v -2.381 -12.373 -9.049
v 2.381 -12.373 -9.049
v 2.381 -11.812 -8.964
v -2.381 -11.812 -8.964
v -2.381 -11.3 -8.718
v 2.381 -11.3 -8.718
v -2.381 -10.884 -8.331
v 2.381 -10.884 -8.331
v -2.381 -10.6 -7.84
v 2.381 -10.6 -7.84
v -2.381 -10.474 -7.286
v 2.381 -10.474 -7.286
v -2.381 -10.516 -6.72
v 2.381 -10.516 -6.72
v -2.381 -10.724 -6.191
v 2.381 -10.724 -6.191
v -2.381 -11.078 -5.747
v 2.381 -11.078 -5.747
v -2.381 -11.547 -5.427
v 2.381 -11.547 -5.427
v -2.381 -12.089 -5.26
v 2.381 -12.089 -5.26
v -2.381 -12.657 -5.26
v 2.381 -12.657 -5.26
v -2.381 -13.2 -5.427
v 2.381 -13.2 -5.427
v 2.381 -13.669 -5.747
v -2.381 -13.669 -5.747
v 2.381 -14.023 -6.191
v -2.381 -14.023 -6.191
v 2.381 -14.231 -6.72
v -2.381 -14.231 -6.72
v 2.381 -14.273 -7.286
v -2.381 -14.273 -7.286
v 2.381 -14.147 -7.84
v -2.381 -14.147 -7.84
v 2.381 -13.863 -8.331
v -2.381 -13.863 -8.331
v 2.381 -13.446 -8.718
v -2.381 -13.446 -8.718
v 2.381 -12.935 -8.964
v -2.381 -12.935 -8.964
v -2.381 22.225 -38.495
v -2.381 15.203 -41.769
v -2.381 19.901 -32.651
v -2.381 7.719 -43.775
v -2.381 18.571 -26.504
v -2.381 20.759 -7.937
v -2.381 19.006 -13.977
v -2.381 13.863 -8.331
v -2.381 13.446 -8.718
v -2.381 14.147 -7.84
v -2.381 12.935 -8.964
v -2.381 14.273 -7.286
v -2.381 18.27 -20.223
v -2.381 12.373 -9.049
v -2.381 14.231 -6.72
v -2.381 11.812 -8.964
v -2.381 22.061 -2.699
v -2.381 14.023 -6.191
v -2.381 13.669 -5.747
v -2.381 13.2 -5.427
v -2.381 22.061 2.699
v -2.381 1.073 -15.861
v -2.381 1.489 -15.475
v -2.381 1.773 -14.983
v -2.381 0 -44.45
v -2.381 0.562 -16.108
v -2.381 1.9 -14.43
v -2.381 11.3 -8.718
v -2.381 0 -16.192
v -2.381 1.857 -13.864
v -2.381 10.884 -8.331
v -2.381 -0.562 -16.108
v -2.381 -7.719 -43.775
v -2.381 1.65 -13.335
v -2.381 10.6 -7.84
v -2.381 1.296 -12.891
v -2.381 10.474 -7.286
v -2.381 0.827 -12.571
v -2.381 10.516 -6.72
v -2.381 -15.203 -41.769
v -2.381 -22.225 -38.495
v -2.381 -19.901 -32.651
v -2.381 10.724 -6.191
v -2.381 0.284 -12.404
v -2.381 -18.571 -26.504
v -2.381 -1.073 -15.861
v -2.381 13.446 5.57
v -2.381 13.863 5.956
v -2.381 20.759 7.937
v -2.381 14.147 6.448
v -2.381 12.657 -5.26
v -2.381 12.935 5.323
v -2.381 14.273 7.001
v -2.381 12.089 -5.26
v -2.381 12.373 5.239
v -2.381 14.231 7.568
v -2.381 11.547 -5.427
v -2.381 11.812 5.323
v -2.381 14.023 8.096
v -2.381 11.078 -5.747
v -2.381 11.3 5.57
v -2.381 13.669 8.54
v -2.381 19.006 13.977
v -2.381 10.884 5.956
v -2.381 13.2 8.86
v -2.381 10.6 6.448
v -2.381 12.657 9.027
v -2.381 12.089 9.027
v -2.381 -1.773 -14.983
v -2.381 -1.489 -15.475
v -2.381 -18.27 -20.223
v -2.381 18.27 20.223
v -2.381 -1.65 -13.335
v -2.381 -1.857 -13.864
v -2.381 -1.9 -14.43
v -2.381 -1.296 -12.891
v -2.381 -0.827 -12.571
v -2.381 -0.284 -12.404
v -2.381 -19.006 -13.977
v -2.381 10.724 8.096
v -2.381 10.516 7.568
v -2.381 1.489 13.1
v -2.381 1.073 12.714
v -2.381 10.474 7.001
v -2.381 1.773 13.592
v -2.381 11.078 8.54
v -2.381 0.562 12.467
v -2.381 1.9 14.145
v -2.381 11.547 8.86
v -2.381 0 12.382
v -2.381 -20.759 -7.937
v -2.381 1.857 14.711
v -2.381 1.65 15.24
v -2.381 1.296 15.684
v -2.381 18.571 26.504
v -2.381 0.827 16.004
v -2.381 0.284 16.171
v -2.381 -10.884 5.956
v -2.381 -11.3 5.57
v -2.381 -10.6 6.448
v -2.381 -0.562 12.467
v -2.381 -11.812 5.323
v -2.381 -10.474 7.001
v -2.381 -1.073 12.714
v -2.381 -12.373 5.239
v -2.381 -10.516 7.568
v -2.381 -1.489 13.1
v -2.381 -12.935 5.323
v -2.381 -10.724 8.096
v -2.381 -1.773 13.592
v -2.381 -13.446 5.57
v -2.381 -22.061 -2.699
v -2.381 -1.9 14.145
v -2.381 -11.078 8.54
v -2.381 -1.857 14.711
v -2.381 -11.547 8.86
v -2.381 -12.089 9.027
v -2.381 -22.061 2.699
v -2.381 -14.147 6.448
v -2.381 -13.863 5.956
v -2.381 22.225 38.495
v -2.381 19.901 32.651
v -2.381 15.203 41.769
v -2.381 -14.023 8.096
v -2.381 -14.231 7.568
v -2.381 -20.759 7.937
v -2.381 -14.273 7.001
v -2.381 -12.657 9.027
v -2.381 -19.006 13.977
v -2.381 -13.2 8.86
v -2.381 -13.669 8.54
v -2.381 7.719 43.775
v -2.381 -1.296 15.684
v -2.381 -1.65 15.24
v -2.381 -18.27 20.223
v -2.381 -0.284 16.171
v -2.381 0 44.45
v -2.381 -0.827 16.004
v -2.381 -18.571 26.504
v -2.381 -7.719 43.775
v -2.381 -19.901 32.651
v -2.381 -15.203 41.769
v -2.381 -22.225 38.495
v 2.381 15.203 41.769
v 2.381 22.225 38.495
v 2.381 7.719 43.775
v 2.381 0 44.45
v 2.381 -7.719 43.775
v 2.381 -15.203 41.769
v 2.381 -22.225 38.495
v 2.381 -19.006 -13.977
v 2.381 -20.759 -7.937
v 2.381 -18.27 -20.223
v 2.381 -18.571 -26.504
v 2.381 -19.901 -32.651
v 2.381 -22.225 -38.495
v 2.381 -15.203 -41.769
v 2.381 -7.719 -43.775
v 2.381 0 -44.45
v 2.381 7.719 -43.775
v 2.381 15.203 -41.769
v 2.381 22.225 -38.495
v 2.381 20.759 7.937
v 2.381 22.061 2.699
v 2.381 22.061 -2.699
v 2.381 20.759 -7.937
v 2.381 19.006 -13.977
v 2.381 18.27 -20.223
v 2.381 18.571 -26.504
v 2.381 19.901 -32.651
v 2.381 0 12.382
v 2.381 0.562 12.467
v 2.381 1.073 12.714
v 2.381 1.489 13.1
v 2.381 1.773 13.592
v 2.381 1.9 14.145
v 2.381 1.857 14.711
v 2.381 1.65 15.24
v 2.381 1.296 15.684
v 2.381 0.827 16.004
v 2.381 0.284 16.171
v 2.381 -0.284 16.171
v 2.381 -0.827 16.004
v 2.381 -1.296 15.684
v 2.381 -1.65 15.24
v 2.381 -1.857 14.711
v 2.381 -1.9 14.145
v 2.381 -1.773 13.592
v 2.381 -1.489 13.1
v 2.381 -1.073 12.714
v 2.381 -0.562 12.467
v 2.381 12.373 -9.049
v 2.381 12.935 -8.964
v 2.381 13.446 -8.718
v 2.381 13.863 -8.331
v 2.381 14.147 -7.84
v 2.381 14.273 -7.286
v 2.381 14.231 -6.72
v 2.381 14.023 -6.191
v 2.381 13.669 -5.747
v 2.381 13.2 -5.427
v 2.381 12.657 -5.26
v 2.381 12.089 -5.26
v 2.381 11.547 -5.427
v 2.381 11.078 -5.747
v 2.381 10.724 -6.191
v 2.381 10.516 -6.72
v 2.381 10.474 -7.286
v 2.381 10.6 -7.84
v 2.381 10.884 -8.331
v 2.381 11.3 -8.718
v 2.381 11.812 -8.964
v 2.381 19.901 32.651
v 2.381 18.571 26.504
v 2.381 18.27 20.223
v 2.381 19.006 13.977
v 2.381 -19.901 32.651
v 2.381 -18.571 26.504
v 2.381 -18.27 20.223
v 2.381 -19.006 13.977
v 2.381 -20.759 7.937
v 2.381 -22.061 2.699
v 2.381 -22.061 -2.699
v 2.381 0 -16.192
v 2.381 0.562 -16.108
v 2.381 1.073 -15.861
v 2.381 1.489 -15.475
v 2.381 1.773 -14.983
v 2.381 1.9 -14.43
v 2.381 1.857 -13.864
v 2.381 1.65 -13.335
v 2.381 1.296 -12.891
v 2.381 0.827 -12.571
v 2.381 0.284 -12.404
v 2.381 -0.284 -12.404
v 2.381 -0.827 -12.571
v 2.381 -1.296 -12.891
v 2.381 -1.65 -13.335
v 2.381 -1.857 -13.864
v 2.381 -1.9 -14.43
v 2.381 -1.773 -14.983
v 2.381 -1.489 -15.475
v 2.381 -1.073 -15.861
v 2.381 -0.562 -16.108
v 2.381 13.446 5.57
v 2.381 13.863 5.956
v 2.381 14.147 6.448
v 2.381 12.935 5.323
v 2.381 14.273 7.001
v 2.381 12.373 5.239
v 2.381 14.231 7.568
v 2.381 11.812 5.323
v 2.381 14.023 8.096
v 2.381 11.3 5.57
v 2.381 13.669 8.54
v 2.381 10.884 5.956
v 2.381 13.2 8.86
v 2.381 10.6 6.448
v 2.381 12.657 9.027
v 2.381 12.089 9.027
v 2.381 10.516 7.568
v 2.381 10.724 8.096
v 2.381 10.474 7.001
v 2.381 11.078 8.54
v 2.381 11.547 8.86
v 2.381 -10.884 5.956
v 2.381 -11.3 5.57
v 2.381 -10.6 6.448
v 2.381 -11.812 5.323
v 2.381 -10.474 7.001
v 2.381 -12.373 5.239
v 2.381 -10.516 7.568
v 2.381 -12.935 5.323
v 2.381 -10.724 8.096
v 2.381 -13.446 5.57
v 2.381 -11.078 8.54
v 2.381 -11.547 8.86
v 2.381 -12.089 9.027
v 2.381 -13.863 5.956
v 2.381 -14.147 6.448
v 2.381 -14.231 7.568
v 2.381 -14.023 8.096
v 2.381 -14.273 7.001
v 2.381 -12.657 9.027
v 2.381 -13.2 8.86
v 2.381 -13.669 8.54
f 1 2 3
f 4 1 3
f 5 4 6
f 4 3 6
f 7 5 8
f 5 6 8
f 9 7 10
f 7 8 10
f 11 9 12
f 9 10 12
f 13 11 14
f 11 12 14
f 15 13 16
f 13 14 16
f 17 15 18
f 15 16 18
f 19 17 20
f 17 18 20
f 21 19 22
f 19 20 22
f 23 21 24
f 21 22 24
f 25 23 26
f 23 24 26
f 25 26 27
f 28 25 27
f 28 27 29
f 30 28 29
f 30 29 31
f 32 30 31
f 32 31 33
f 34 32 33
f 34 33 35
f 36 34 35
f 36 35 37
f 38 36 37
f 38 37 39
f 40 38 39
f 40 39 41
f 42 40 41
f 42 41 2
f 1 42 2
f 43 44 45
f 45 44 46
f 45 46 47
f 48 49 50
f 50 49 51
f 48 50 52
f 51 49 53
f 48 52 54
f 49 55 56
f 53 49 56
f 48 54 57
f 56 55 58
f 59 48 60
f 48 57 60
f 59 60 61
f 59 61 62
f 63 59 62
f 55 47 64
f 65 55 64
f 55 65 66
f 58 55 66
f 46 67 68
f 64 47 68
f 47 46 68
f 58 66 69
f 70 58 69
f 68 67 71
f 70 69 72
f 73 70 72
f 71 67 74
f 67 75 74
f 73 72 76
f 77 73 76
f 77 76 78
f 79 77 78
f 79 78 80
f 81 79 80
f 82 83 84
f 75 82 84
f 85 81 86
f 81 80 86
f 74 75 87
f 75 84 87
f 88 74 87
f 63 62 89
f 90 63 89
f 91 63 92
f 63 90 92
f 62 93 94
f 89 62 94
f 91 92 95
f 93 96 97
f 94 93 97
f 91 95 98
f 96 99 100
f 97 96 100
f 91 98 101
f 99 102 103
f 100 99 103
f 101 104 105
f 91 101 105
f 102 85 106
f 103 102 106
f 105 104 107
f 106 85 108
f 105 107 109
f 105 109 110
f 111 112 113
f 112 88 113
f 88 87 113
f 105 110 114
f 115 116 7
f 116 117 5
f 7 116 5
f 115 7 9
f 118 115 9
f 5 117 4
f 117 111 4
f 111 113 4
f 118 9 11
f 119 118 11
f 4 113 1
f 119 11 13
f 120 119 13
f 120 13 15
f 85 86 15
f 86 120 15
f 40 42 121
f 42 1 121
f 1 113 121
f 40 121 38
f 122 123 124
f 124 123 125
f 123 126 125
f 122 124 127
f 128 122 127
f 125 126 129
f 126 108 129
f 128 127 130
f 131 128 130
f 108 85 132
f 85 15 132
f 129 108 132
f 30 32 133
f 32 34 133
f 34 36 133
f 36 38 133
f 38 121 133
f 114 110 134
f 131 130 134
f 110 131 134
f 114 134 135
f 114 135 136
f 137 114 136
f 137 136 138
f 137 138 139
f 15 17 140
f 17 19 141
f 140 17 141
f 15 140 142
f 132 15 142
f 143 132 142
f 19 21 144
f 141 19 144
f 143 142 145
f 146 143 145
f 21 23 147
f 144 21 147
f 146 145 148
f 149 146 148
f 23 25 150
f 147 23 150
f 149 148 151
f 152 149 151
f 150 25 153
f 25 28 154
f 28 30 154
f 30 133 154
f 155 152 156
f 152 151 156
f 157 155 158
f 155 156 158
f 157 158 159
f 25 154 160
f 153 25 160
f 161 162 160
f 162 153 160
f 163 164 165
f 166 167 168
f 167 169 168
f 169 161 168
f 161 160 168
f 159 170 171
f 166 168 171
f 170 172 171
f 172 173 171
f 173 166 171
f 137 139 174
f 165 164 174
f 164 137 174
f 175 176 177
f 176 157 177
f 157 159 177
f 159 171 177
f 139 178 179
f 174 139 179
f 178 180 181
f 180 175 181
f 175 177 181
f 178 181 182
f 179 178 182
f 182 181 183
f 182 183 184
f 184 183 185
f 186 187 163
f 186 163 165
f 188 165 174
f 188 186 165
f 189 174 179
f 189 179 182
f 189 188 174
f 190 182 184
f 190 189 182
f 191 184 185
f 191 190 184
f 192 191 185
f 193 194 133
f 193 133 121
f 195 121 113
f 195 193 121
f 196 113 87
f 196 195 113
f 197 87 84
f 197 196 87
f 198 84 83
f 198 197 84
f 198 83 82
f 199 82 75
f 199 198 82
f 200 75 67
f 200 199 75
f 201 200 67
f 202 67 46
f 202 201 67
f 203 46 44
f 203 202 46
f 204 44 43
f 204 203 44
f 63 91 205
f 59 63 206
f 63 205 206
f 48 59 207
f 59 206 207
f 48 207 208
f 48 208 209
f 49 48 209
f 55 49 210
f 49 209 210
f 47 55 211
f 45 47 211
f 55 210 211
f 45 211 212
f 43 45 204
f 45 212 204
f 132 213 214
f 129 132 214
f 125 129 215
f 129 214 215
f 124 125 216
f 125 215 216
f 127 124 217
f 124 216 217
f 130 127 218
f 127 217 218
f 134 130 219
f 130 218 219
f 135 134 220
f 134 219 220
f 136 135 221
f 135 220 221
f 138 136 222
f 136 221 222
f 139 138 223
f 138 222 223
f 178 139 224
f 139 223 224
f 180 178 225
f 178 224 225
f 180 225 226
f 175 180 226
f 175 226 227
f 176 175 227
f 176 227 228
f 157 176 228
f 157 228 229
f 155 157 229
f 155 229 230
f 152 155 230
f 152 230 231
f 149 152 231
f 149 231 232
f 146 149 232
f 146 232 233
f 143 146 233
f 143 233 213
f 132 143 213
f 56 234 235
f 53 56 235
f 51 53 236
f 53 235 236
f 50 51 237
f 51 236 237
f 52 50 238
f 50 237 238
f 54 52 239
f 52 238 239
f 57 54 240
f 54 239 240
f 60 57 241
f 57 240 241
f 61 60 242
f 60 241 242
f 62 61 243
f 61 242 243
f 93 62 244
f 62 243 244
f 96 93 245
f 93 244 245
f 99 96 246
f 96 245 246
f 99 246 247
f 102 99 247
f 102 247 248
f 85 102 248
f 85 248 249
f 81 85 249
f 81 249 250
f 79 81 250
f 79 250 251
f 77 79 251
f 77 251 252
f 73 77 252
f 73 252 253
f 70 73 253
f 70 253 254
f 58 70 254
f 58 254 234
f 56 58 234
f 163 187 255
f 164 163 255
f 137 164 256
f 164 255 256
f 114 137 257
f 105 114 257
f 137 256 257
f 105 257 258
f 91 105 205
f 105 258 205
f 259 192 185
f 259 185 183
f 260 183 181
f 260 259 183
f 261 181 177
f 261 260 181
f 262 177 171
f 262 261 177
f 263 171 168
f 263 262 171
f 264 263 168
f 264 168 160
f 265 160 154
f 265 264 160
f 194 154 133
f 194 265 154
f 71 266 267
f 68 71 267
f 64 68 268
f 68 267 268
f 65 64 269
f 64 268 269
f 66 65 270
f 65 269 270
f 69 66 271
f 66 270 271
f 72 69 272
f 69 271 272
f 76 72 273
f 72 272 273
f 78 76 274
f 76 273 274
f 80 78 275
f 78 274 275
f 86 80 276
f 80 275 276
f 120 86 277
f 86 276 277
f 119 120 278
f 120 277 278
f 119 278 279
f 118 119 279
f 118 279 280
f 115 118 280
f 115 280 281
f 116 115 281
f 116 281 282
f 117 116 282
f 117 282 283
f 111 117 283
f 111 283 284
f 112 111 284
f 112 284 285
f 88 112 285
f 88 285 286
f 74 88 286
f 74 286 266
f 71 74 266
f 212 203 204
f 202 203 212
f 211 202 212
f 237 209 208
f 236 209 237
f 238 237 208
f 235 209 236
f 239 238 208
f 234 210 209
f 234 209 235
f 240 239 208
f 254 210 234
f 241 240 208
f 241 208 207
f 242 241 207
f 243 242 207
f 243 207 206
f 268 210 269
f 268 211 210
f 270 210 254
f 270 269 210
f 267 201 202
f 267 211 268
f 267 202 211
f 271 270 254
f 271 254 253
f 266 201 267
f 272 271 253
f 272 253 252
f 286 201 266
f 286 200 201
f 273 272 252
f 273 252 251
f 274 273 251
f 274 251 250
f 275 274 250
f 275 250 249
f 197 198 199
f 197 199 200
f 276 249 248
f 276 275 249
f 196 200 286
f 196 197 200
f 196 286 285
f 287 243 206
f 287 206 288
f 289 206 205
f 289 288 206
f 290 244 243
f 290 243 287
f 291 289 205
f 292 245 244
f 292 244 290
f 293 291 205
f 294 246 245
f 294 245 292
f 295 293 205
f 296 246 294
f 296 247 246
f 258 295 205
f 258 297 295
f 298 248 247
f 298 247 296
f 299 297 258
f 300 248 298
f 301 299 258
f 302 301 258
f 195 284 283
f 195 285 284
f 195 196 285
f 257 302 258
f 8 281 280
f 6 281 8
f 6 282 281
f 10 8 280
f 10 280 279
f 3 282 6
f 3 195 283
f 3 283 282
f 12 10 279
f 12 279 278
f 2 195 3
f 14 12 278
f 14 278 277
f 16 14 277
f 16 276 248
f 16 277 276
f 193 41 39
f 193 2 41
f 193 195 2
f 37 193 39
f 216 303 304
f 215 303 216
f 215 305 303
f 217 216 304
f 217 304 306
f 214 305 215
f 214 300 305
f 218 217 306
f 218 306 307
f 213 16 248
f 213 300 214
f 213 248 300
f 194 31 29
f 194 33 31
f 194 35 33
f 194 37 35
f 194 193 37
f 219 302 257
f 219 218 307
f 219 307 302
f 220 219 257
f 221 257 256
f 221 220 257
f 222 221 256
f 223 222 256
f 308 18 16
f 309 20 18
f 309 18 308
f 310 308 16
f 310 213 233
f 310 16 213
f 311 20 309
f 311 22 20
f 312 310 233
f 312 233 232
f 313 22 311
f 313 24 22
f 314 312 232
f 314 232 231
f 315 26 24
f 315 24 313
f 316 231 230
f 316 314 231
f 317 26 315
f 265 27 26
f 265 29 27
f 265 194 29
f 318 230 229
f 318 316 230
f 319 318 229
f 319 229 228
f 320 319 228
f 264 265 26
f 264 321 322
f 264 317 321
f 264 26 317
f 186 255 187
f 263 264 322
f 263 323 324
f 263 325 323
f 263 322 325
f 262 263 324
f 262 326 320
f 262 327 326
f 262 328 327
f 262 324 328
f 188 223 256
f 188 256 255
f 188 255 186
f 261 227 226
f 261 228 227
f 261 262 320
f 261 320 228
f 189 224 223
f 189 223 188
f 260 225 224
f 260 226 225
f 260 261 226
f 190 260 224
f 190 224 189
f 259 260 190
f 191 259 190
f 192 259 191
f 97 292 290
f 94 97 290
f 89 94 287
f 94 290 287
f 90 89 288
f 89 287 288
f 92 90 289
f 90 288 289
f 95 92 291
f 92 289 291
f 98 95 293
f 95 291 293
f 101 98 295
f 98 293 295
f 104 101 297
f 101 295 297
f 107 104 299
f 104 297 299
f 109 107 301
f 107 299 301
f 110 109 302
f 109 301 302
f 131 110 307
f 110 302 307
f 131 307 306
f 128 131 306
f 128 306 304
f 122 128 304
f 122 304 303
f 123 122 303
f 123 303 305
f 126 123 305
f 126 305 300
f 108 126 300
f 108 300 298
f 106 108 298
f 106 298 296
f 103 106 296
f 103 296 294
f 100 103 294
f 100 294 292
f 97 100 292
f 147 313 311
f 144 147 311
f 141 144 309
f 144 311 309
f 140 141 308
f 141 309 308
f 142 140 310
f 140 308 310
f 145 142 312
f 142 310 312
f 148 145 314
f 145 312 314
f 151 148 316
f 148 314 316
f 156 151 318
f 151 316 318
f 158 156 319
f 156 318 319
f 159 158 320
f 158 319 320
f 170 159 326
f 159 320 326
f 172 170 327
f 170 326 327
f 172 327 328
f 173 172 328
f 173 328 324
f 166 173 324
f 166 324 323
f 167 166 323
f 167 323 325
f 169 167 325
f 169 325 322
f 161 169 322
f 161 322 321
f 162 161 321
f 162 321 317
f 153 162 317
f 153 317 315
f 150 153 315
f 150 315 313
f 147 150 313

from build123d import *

# Parameters (mm, degrees)
SKETCH1_R            = 44.45
BOSS_EXTRUDE1_DEPTH  = 2.38125
CUT_EXTRUDE1_DEPTH   = 64.041941644
SKETCH3_R            = 1.905
MOUNTING_HOLES_DEPTH = 50.924287989


with BuildPart() as part:
    # Sketch1 → Boss-Extrude1 (new, symmetric)
    with BuildSketch(Plane(origin=(0, 0, 0), x_dir=(0, 0, -1), z_dir=(1, 0, 0))):
        with Locations(Location((0, 0, 0), (0, 0, 180))):
            Circle(SKETCH1_R)
    extrude(amount=BOSS_EXTRUDE1_DEPTH, both=True)

    # Sketch2 → Cut-Extrude1 (cut, through all)
    with BuildSketch(Plane(origin=(2.38125, 0, 0), x_dir=(0, 0, -1), z_dir=(1, 0, 0))):
        with BuildLine():
            ThreePointArc((-7.937372074, -20.759305132), (0, -22.225), (7.937372074, -20.759305132))
            ThreePointArc((7.937372074, -20.759305132), (23.369671575, -18.290437479), (38.494829198, -22.225))
            ThreePointArc((38.494829198, -22.225), (0, -44.45), (-38.494829198, -22.225))
            ThreePointArc((-38.494829198, -22.225), (-23.369671575, -18.290437479), (-7.937372074, -20.759305132))
        make_face()
        with BuildLine():
            ThreePointArc((-38.494829198, 22.225), (-23.369671575, 18.290437479), (-7.937372074, 20.759305132))
            ThreePointArc((-7.937372074, 20.759305132), (0, 22.225), (7.937372074, 20.759305132))
            ThreePointArc((7.937372074, 20.759305132), (23.369671575, 18.290437479), (38.494829198, 22.225))
            ThreePointArc((38.494829198, 22.225), (0, 44.45), (-38.494829198, 22.225))
        make_face()
    extrude(amount=-CUT_EXTRUDE1_DEPTH, mode=Mode.SUBTRACT)

    # Sketch3 → Mounting holes (cut, through all)
    with BuildSketch(Plane(origin=(2.38125, 0, 0), x_dir=(0, 0, -1), z_dir=(1, 0, 0))):
        with Locations((-14.2875, 0)):
            Circle(SKETCH3_R)
        with Locations((-7.14375, 12.373337957)):
            Circle(SKETCH3_R)
        with Locations((7.14375, 12.373337957)):
            Circle(SKETCH3_R)
        with Locations((14.2875, 0)):
            Circle(SKETCH3_R)
        with Locations((7.14375, -12.373337957)):
            Circle(SKETCH3_R)
        with Locations((-7.14375, -12.373337957)):
            Circle(SKETCH3_R)
    extrude(amount=-MOUNTING_HOLES_DEPTH, mode=Mode.SUBTRACT)


solid = part.part
